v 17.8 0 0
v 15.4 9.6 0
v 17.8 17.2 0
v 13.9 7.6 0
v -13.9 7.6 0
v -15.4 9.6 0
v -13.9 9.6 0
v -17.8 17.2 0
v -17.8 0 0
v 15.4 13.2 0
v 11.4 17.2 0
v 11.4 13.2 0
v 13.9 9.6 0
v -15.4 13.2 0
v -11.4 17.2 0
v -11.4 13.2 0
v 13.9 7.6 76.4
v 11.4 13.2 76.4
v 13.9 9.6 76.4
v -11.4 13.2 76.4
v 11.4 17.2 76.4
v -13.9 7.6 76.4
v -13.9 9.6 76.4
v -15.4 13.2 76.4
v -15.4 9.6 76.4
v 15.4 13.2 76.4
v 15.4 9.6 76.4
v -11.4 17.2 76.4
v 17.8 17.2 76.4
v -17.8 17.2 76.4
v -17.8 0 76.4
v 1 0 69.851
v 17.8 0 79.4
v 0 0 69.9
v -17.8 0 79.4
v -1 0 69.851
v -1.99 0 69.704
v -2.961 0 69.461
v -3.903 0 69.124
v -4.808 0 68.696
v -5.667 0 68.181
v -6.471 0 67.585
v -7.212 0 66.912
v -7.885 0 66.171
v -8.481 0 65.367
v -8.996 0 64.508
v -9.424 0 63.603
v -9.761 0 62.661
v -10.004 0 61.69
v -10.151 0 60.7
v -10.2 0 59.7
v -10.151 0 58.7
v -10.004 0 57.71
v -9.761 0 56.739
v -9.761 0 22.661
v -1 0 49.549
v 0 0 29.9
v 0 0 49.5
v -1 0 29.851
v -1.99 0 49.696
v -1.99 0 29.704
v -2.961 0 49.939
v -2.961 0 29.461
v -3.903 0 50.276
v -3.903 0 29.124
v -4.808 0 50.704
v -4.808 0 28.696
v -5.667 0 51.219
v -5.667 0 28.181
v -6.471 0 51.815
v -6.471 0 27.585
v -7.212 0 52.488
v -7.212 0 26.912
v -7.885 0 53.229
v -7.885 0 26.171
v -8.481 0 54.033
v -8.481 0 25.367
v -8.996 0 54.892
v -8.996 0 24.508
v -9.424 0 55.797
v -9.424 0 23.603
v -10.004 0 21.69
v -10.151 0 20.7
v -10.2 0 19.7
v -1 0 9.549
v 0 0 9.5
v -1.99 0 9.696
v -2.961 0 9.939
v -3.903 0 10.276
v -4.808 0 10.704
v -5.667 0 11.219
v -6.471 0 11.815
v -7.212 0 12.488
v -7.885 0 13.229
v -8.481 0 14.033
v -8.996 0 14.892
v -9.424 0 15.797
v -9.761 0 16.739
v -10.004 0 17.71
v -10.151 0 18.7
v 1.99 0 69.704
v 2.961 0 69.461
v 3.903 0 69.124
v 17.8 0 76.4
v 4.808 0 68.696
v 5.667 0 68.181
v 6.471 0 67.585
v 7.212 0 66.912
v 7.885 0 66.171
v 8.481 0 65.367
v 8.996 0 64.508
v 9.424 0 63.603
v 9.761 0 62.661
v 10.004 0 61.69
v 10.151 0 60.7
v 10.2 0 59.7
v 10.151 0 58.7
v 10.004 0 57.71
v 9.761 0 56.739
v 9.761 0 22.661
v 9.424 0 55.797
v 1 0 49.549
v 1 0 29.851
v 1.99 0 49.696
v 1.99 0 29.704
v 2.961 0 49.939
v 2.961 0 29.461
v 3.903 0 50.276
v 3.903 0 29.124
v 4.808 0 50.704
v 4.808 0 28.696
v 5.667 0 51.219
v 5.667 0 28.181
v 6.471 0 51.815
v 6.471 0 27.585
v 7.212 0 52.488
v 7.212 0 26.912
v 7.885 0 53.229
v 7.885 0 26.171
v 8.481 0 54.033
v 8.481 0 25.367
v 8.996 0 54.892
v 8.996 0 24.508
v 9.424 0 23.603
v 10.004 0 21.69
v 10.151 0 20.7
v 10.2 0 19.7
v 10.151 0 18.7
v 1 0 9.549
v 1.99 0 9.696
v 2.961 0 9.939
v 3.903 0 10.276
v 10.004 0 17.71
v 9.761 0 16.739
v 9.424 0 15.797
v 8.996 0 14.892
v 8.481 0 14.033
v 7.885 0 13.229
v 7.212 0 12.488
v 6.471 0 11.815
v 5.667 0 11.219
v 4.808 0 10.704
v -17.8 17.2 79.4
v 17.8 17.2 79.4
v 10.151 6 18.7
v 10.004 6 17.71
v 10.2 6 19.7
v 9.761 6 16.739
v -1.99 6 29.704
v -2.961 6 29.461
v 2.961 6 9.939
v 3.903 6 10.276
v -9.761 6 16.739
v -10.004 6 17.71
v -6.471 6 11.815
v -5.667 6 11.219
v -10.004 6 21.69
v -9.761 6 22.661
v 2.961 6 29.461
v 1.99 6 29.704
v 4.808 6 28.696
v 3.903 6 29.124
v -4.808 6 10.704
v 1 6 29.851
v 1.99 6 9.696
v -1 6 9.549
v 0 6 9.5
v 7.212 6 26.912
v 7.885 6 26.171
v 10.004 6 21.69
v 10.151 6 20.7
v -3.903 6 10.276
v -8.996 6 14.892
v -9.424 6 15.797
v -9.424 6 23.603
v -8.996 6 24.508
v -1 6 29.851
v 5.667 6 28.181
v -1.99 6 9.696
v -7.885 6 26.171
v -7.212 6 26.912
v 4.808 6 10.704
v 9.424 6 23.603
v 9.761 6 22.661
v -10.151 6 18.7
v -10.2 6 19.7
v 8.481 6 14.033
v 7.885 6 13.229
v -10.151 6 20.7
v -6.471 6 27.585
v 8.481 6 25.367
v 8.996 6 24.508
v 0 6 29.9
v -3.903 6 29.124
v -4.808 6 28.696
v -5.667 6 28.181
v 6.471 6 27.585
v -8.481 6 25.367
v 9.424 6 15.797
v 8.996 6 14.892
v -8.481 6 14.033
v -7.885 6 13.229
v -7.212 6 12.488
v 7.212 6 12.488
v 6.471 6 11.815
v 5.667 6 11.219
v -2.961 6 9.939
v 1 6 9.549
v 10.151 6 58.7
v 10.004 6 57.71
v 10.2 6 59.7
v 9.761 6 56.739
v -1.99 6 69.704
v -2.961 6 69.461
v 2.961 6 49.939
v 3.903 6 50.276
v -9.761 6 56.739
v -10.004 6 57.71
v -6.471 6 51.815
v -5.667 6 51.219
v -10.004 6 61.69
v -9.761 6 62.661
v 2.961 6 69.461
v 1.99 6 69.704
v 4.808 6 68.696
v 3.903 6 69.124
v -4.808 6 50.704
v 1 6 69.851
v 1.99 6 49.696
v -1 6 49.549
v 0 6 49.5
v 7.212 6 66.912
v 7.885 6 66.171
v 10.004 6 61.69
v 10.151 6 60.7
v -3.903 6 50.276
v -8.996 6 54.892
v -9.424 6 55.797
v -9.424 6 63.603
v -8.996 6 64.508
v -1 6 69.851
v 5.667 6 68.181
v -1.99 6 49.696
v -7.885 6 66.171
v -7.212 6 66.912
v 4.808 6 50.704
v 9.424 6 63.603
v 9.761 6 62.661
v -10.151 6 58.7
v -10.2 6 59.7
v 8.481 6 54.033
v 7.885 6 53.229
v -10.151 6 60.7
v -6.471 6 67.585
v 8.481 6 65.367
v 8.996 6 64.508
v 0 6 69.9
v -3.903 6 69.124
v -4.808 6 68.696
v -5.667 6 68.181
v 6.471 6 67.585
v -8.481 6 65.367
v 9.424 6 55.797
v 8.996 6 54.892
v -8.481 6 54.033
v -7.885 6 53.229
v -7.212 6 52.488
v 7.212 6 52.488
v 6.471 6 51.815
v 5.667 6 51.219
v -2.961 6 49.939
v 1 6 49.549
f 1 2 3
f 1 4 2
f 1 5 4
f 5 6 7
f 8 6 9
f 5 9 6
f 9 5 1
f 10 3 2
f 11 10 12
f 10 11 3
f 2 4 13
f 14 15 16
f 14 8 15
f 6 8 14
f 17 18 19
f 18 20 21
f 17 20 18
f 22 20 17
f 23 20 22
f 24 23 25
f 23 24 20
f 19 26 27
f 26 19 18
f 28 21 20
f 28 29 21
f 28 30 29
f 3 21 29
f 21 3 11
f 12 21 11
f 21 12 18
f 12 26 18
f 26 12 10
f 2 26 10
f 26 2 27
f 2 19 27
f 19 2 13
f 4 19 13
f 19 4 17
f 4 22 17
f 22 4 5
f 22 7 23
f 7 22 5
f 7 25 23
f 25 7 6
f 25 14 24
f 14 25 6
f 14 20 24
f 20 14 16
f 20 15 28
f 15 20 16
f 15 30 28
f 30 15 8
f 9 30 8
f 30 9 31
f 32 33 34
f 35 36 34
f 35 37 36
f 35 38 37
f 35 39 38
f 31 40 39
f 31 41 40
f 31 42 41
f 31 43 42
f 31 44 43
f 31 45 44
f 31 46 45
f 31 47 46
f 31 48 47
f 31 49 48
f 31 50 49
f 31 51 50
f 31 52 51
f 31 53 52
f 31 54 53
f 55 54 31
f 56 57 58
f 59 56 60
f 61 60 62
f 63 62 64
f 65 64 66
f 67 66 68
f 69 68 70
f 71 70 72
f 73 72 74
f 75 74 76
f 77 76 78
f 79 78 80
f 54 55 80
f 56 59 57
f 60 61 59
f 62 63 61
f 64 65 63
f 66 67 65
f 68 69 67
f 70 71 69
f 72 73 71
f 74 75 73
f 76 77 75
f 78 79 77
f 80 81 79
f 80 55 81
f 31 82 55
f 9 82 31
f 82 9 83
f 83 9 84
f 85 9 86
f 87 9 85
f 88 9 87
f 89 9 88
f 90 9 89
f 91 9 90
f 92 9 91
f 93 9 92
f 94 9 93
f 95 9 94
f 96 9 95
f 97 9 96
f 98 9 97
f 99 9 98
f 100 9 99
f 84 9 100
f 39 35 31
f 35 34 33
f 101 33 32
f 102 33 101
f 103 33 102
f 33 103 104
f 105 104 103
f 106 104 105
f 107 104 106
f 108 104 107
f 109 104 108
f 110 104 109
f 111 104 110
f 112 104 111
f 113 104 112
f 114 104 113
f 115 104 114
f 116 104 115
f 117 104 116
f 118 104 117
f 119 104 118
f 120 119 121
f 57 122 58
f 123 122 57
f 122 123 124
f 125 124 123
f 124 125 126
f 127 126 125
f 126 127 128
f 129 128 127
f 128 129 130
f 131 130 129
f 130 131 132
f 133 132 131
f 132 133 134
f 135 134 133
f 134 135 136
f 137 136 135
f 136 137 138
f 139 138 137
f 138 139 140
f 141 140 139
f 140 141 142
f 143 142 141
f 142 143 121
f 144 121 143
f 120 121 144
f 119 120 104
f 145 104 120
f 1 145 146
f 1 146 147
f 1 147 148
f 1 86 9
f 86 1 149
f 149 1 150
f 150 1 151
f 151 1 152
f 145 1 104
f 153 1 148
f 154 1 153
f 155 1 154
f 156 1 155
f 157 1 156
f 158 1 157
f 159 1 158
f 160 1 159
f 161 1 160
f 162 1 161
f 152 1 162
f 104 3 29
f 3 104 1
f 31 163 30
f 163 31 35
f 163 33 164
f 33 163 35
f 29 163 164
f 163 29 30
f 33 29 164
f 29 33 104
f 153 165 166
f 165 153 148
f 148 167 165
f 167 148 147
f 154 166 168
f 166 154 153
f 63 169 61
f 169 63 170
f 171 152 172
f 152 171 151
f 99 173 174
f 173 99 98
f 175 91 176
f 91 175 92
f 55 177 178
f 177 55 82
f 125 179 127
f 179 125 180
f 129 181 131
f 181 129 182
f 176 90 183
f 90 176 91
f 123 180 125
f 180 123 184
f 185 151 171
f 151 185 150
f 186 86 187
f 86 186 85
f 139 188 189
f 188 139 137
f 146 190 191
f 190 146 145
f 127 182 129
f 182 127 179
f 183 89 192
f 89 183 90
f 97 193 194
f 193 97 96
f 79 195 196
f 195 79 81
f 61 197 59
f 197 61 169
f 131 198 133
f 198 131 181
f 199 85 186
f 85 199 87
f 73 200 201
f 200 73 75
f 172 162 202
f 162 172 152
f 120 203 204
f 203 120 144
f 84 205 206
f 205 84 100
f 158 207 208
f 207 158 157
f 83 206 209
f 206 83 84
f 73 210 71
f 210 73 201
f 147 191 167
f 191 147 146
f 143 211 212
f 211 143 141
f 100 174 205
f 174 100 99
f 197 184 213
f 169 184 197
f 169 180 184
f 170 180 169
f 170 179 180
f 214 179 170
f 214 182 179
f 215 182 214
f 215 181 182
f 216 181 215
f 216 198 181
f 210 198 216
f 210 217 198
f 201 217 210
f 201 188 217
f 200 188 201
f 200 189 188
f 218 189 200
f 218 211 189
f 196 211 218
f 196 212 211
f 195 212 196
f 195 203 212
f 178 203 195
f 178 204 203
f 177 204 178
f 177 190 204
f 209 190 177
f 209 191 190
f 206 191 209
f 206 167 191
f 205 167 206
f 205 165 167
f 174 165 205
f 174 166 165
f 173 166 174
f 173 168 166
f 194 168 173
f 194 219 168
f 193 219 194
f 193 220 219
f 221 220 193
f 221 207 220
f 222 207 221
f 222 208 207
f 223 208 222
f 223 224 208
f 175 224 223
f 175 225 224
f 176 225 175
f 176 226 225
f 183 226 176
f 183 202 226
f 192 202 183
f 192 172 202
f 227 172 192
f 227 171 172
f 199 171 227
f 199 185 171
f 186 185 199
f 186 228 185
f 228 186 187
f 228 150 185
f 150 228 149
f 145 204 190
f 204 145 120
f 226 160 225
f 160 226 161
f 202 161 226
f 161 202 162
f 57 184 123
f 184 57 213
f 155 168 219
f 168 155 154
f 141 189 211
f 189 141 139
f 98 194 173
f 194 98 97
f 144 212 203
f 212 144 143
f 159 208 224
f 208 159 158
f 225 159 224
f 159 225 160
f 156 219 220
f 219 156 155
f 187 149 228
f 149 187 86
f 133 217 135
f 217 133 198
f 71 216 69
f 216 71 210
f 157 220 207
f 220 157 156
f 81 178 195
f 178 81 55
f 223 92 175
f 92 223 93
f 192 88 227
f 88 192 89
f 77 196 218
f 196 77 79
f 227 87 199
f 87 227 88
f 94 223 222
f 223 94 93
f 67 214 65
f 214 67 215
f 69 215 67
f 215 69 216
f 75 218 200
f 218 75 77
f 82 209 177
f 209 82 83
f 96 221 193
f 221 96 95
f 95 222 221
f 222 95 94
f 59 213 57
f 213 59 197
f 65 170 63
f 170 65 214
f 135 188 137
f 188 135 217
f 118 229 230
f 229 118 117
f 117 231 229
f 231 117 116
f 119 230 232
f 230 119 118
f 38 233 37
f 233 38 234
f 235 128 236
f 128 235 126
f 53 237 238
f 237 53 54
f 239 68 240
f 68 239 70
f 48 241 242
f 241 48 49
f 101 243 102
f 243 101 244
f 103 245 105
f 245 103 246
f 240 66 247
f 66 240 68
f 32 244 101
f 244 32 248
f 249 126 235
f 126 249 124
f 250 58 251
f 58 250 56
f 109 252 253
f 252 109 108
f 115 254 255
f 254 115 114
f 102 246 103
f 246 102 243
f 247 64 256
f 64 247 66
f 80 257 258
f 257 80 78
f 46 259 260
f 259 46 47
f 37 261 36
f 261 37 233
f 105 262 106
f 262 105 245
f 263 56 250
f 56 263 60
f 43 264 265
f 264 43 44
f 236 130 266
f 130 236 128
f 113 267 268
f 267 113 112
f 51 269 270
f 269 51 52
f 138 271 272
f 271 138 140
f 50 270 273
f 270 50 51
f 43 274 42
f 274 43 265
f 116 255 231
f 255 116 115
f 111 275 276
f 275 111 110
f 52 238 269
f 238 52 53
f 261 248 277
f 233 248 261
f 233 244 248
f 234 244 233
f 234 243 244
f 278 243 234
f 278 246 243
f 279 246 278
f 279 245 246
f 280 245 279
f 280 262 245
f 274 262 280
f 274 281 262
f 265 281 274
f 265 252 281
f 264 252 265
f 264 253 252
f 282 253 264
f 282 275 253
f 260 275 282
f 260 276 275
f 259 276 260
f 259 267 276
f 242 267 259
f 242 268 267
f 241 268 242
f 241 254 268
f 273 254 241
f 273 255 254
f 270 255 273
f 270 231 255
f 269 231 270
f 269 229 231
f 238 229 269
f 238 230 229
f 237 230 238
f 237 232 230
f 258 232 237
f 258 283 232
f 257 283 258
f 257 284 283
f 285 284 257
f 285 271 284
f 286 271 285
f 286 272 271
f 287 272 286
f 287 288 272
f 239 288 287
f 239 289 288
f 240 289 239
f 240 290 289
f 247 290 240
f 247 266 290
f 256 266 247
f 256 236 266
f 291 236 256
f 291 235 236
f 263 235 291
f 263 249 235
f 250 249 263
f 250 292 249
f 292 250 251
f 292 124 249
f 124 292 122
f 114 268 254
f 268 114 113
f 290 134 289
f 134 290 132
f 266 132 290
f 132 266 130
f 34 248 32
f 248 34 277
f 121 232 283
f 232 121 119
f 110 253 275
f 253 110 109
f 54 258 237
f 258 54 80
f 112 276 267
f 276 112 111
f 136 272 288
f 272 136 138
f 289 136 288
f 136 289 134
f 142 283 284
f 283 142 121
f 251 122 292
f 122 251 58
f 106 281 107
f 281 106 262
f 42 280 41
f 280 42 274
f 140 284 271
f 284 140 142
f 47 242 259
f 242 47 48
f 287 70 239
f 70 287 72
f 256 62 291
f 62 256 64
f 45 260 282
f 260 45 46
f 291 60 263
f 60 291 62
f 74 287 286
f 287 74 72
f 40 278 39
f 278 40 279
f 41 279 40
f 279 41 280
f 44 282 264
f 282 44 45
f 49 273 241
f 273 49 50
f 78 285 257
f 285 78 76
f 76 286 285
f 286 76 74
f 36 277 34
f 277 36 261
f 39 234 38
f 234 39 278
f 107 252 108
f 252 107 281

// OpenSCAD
// Render target: the 3D-printed outer body (extruded channel + magnet pockets).
//   openscad -o ../stl/outer_body.stl outer_body.scad
include <enclosure.scad>
outer_body();
